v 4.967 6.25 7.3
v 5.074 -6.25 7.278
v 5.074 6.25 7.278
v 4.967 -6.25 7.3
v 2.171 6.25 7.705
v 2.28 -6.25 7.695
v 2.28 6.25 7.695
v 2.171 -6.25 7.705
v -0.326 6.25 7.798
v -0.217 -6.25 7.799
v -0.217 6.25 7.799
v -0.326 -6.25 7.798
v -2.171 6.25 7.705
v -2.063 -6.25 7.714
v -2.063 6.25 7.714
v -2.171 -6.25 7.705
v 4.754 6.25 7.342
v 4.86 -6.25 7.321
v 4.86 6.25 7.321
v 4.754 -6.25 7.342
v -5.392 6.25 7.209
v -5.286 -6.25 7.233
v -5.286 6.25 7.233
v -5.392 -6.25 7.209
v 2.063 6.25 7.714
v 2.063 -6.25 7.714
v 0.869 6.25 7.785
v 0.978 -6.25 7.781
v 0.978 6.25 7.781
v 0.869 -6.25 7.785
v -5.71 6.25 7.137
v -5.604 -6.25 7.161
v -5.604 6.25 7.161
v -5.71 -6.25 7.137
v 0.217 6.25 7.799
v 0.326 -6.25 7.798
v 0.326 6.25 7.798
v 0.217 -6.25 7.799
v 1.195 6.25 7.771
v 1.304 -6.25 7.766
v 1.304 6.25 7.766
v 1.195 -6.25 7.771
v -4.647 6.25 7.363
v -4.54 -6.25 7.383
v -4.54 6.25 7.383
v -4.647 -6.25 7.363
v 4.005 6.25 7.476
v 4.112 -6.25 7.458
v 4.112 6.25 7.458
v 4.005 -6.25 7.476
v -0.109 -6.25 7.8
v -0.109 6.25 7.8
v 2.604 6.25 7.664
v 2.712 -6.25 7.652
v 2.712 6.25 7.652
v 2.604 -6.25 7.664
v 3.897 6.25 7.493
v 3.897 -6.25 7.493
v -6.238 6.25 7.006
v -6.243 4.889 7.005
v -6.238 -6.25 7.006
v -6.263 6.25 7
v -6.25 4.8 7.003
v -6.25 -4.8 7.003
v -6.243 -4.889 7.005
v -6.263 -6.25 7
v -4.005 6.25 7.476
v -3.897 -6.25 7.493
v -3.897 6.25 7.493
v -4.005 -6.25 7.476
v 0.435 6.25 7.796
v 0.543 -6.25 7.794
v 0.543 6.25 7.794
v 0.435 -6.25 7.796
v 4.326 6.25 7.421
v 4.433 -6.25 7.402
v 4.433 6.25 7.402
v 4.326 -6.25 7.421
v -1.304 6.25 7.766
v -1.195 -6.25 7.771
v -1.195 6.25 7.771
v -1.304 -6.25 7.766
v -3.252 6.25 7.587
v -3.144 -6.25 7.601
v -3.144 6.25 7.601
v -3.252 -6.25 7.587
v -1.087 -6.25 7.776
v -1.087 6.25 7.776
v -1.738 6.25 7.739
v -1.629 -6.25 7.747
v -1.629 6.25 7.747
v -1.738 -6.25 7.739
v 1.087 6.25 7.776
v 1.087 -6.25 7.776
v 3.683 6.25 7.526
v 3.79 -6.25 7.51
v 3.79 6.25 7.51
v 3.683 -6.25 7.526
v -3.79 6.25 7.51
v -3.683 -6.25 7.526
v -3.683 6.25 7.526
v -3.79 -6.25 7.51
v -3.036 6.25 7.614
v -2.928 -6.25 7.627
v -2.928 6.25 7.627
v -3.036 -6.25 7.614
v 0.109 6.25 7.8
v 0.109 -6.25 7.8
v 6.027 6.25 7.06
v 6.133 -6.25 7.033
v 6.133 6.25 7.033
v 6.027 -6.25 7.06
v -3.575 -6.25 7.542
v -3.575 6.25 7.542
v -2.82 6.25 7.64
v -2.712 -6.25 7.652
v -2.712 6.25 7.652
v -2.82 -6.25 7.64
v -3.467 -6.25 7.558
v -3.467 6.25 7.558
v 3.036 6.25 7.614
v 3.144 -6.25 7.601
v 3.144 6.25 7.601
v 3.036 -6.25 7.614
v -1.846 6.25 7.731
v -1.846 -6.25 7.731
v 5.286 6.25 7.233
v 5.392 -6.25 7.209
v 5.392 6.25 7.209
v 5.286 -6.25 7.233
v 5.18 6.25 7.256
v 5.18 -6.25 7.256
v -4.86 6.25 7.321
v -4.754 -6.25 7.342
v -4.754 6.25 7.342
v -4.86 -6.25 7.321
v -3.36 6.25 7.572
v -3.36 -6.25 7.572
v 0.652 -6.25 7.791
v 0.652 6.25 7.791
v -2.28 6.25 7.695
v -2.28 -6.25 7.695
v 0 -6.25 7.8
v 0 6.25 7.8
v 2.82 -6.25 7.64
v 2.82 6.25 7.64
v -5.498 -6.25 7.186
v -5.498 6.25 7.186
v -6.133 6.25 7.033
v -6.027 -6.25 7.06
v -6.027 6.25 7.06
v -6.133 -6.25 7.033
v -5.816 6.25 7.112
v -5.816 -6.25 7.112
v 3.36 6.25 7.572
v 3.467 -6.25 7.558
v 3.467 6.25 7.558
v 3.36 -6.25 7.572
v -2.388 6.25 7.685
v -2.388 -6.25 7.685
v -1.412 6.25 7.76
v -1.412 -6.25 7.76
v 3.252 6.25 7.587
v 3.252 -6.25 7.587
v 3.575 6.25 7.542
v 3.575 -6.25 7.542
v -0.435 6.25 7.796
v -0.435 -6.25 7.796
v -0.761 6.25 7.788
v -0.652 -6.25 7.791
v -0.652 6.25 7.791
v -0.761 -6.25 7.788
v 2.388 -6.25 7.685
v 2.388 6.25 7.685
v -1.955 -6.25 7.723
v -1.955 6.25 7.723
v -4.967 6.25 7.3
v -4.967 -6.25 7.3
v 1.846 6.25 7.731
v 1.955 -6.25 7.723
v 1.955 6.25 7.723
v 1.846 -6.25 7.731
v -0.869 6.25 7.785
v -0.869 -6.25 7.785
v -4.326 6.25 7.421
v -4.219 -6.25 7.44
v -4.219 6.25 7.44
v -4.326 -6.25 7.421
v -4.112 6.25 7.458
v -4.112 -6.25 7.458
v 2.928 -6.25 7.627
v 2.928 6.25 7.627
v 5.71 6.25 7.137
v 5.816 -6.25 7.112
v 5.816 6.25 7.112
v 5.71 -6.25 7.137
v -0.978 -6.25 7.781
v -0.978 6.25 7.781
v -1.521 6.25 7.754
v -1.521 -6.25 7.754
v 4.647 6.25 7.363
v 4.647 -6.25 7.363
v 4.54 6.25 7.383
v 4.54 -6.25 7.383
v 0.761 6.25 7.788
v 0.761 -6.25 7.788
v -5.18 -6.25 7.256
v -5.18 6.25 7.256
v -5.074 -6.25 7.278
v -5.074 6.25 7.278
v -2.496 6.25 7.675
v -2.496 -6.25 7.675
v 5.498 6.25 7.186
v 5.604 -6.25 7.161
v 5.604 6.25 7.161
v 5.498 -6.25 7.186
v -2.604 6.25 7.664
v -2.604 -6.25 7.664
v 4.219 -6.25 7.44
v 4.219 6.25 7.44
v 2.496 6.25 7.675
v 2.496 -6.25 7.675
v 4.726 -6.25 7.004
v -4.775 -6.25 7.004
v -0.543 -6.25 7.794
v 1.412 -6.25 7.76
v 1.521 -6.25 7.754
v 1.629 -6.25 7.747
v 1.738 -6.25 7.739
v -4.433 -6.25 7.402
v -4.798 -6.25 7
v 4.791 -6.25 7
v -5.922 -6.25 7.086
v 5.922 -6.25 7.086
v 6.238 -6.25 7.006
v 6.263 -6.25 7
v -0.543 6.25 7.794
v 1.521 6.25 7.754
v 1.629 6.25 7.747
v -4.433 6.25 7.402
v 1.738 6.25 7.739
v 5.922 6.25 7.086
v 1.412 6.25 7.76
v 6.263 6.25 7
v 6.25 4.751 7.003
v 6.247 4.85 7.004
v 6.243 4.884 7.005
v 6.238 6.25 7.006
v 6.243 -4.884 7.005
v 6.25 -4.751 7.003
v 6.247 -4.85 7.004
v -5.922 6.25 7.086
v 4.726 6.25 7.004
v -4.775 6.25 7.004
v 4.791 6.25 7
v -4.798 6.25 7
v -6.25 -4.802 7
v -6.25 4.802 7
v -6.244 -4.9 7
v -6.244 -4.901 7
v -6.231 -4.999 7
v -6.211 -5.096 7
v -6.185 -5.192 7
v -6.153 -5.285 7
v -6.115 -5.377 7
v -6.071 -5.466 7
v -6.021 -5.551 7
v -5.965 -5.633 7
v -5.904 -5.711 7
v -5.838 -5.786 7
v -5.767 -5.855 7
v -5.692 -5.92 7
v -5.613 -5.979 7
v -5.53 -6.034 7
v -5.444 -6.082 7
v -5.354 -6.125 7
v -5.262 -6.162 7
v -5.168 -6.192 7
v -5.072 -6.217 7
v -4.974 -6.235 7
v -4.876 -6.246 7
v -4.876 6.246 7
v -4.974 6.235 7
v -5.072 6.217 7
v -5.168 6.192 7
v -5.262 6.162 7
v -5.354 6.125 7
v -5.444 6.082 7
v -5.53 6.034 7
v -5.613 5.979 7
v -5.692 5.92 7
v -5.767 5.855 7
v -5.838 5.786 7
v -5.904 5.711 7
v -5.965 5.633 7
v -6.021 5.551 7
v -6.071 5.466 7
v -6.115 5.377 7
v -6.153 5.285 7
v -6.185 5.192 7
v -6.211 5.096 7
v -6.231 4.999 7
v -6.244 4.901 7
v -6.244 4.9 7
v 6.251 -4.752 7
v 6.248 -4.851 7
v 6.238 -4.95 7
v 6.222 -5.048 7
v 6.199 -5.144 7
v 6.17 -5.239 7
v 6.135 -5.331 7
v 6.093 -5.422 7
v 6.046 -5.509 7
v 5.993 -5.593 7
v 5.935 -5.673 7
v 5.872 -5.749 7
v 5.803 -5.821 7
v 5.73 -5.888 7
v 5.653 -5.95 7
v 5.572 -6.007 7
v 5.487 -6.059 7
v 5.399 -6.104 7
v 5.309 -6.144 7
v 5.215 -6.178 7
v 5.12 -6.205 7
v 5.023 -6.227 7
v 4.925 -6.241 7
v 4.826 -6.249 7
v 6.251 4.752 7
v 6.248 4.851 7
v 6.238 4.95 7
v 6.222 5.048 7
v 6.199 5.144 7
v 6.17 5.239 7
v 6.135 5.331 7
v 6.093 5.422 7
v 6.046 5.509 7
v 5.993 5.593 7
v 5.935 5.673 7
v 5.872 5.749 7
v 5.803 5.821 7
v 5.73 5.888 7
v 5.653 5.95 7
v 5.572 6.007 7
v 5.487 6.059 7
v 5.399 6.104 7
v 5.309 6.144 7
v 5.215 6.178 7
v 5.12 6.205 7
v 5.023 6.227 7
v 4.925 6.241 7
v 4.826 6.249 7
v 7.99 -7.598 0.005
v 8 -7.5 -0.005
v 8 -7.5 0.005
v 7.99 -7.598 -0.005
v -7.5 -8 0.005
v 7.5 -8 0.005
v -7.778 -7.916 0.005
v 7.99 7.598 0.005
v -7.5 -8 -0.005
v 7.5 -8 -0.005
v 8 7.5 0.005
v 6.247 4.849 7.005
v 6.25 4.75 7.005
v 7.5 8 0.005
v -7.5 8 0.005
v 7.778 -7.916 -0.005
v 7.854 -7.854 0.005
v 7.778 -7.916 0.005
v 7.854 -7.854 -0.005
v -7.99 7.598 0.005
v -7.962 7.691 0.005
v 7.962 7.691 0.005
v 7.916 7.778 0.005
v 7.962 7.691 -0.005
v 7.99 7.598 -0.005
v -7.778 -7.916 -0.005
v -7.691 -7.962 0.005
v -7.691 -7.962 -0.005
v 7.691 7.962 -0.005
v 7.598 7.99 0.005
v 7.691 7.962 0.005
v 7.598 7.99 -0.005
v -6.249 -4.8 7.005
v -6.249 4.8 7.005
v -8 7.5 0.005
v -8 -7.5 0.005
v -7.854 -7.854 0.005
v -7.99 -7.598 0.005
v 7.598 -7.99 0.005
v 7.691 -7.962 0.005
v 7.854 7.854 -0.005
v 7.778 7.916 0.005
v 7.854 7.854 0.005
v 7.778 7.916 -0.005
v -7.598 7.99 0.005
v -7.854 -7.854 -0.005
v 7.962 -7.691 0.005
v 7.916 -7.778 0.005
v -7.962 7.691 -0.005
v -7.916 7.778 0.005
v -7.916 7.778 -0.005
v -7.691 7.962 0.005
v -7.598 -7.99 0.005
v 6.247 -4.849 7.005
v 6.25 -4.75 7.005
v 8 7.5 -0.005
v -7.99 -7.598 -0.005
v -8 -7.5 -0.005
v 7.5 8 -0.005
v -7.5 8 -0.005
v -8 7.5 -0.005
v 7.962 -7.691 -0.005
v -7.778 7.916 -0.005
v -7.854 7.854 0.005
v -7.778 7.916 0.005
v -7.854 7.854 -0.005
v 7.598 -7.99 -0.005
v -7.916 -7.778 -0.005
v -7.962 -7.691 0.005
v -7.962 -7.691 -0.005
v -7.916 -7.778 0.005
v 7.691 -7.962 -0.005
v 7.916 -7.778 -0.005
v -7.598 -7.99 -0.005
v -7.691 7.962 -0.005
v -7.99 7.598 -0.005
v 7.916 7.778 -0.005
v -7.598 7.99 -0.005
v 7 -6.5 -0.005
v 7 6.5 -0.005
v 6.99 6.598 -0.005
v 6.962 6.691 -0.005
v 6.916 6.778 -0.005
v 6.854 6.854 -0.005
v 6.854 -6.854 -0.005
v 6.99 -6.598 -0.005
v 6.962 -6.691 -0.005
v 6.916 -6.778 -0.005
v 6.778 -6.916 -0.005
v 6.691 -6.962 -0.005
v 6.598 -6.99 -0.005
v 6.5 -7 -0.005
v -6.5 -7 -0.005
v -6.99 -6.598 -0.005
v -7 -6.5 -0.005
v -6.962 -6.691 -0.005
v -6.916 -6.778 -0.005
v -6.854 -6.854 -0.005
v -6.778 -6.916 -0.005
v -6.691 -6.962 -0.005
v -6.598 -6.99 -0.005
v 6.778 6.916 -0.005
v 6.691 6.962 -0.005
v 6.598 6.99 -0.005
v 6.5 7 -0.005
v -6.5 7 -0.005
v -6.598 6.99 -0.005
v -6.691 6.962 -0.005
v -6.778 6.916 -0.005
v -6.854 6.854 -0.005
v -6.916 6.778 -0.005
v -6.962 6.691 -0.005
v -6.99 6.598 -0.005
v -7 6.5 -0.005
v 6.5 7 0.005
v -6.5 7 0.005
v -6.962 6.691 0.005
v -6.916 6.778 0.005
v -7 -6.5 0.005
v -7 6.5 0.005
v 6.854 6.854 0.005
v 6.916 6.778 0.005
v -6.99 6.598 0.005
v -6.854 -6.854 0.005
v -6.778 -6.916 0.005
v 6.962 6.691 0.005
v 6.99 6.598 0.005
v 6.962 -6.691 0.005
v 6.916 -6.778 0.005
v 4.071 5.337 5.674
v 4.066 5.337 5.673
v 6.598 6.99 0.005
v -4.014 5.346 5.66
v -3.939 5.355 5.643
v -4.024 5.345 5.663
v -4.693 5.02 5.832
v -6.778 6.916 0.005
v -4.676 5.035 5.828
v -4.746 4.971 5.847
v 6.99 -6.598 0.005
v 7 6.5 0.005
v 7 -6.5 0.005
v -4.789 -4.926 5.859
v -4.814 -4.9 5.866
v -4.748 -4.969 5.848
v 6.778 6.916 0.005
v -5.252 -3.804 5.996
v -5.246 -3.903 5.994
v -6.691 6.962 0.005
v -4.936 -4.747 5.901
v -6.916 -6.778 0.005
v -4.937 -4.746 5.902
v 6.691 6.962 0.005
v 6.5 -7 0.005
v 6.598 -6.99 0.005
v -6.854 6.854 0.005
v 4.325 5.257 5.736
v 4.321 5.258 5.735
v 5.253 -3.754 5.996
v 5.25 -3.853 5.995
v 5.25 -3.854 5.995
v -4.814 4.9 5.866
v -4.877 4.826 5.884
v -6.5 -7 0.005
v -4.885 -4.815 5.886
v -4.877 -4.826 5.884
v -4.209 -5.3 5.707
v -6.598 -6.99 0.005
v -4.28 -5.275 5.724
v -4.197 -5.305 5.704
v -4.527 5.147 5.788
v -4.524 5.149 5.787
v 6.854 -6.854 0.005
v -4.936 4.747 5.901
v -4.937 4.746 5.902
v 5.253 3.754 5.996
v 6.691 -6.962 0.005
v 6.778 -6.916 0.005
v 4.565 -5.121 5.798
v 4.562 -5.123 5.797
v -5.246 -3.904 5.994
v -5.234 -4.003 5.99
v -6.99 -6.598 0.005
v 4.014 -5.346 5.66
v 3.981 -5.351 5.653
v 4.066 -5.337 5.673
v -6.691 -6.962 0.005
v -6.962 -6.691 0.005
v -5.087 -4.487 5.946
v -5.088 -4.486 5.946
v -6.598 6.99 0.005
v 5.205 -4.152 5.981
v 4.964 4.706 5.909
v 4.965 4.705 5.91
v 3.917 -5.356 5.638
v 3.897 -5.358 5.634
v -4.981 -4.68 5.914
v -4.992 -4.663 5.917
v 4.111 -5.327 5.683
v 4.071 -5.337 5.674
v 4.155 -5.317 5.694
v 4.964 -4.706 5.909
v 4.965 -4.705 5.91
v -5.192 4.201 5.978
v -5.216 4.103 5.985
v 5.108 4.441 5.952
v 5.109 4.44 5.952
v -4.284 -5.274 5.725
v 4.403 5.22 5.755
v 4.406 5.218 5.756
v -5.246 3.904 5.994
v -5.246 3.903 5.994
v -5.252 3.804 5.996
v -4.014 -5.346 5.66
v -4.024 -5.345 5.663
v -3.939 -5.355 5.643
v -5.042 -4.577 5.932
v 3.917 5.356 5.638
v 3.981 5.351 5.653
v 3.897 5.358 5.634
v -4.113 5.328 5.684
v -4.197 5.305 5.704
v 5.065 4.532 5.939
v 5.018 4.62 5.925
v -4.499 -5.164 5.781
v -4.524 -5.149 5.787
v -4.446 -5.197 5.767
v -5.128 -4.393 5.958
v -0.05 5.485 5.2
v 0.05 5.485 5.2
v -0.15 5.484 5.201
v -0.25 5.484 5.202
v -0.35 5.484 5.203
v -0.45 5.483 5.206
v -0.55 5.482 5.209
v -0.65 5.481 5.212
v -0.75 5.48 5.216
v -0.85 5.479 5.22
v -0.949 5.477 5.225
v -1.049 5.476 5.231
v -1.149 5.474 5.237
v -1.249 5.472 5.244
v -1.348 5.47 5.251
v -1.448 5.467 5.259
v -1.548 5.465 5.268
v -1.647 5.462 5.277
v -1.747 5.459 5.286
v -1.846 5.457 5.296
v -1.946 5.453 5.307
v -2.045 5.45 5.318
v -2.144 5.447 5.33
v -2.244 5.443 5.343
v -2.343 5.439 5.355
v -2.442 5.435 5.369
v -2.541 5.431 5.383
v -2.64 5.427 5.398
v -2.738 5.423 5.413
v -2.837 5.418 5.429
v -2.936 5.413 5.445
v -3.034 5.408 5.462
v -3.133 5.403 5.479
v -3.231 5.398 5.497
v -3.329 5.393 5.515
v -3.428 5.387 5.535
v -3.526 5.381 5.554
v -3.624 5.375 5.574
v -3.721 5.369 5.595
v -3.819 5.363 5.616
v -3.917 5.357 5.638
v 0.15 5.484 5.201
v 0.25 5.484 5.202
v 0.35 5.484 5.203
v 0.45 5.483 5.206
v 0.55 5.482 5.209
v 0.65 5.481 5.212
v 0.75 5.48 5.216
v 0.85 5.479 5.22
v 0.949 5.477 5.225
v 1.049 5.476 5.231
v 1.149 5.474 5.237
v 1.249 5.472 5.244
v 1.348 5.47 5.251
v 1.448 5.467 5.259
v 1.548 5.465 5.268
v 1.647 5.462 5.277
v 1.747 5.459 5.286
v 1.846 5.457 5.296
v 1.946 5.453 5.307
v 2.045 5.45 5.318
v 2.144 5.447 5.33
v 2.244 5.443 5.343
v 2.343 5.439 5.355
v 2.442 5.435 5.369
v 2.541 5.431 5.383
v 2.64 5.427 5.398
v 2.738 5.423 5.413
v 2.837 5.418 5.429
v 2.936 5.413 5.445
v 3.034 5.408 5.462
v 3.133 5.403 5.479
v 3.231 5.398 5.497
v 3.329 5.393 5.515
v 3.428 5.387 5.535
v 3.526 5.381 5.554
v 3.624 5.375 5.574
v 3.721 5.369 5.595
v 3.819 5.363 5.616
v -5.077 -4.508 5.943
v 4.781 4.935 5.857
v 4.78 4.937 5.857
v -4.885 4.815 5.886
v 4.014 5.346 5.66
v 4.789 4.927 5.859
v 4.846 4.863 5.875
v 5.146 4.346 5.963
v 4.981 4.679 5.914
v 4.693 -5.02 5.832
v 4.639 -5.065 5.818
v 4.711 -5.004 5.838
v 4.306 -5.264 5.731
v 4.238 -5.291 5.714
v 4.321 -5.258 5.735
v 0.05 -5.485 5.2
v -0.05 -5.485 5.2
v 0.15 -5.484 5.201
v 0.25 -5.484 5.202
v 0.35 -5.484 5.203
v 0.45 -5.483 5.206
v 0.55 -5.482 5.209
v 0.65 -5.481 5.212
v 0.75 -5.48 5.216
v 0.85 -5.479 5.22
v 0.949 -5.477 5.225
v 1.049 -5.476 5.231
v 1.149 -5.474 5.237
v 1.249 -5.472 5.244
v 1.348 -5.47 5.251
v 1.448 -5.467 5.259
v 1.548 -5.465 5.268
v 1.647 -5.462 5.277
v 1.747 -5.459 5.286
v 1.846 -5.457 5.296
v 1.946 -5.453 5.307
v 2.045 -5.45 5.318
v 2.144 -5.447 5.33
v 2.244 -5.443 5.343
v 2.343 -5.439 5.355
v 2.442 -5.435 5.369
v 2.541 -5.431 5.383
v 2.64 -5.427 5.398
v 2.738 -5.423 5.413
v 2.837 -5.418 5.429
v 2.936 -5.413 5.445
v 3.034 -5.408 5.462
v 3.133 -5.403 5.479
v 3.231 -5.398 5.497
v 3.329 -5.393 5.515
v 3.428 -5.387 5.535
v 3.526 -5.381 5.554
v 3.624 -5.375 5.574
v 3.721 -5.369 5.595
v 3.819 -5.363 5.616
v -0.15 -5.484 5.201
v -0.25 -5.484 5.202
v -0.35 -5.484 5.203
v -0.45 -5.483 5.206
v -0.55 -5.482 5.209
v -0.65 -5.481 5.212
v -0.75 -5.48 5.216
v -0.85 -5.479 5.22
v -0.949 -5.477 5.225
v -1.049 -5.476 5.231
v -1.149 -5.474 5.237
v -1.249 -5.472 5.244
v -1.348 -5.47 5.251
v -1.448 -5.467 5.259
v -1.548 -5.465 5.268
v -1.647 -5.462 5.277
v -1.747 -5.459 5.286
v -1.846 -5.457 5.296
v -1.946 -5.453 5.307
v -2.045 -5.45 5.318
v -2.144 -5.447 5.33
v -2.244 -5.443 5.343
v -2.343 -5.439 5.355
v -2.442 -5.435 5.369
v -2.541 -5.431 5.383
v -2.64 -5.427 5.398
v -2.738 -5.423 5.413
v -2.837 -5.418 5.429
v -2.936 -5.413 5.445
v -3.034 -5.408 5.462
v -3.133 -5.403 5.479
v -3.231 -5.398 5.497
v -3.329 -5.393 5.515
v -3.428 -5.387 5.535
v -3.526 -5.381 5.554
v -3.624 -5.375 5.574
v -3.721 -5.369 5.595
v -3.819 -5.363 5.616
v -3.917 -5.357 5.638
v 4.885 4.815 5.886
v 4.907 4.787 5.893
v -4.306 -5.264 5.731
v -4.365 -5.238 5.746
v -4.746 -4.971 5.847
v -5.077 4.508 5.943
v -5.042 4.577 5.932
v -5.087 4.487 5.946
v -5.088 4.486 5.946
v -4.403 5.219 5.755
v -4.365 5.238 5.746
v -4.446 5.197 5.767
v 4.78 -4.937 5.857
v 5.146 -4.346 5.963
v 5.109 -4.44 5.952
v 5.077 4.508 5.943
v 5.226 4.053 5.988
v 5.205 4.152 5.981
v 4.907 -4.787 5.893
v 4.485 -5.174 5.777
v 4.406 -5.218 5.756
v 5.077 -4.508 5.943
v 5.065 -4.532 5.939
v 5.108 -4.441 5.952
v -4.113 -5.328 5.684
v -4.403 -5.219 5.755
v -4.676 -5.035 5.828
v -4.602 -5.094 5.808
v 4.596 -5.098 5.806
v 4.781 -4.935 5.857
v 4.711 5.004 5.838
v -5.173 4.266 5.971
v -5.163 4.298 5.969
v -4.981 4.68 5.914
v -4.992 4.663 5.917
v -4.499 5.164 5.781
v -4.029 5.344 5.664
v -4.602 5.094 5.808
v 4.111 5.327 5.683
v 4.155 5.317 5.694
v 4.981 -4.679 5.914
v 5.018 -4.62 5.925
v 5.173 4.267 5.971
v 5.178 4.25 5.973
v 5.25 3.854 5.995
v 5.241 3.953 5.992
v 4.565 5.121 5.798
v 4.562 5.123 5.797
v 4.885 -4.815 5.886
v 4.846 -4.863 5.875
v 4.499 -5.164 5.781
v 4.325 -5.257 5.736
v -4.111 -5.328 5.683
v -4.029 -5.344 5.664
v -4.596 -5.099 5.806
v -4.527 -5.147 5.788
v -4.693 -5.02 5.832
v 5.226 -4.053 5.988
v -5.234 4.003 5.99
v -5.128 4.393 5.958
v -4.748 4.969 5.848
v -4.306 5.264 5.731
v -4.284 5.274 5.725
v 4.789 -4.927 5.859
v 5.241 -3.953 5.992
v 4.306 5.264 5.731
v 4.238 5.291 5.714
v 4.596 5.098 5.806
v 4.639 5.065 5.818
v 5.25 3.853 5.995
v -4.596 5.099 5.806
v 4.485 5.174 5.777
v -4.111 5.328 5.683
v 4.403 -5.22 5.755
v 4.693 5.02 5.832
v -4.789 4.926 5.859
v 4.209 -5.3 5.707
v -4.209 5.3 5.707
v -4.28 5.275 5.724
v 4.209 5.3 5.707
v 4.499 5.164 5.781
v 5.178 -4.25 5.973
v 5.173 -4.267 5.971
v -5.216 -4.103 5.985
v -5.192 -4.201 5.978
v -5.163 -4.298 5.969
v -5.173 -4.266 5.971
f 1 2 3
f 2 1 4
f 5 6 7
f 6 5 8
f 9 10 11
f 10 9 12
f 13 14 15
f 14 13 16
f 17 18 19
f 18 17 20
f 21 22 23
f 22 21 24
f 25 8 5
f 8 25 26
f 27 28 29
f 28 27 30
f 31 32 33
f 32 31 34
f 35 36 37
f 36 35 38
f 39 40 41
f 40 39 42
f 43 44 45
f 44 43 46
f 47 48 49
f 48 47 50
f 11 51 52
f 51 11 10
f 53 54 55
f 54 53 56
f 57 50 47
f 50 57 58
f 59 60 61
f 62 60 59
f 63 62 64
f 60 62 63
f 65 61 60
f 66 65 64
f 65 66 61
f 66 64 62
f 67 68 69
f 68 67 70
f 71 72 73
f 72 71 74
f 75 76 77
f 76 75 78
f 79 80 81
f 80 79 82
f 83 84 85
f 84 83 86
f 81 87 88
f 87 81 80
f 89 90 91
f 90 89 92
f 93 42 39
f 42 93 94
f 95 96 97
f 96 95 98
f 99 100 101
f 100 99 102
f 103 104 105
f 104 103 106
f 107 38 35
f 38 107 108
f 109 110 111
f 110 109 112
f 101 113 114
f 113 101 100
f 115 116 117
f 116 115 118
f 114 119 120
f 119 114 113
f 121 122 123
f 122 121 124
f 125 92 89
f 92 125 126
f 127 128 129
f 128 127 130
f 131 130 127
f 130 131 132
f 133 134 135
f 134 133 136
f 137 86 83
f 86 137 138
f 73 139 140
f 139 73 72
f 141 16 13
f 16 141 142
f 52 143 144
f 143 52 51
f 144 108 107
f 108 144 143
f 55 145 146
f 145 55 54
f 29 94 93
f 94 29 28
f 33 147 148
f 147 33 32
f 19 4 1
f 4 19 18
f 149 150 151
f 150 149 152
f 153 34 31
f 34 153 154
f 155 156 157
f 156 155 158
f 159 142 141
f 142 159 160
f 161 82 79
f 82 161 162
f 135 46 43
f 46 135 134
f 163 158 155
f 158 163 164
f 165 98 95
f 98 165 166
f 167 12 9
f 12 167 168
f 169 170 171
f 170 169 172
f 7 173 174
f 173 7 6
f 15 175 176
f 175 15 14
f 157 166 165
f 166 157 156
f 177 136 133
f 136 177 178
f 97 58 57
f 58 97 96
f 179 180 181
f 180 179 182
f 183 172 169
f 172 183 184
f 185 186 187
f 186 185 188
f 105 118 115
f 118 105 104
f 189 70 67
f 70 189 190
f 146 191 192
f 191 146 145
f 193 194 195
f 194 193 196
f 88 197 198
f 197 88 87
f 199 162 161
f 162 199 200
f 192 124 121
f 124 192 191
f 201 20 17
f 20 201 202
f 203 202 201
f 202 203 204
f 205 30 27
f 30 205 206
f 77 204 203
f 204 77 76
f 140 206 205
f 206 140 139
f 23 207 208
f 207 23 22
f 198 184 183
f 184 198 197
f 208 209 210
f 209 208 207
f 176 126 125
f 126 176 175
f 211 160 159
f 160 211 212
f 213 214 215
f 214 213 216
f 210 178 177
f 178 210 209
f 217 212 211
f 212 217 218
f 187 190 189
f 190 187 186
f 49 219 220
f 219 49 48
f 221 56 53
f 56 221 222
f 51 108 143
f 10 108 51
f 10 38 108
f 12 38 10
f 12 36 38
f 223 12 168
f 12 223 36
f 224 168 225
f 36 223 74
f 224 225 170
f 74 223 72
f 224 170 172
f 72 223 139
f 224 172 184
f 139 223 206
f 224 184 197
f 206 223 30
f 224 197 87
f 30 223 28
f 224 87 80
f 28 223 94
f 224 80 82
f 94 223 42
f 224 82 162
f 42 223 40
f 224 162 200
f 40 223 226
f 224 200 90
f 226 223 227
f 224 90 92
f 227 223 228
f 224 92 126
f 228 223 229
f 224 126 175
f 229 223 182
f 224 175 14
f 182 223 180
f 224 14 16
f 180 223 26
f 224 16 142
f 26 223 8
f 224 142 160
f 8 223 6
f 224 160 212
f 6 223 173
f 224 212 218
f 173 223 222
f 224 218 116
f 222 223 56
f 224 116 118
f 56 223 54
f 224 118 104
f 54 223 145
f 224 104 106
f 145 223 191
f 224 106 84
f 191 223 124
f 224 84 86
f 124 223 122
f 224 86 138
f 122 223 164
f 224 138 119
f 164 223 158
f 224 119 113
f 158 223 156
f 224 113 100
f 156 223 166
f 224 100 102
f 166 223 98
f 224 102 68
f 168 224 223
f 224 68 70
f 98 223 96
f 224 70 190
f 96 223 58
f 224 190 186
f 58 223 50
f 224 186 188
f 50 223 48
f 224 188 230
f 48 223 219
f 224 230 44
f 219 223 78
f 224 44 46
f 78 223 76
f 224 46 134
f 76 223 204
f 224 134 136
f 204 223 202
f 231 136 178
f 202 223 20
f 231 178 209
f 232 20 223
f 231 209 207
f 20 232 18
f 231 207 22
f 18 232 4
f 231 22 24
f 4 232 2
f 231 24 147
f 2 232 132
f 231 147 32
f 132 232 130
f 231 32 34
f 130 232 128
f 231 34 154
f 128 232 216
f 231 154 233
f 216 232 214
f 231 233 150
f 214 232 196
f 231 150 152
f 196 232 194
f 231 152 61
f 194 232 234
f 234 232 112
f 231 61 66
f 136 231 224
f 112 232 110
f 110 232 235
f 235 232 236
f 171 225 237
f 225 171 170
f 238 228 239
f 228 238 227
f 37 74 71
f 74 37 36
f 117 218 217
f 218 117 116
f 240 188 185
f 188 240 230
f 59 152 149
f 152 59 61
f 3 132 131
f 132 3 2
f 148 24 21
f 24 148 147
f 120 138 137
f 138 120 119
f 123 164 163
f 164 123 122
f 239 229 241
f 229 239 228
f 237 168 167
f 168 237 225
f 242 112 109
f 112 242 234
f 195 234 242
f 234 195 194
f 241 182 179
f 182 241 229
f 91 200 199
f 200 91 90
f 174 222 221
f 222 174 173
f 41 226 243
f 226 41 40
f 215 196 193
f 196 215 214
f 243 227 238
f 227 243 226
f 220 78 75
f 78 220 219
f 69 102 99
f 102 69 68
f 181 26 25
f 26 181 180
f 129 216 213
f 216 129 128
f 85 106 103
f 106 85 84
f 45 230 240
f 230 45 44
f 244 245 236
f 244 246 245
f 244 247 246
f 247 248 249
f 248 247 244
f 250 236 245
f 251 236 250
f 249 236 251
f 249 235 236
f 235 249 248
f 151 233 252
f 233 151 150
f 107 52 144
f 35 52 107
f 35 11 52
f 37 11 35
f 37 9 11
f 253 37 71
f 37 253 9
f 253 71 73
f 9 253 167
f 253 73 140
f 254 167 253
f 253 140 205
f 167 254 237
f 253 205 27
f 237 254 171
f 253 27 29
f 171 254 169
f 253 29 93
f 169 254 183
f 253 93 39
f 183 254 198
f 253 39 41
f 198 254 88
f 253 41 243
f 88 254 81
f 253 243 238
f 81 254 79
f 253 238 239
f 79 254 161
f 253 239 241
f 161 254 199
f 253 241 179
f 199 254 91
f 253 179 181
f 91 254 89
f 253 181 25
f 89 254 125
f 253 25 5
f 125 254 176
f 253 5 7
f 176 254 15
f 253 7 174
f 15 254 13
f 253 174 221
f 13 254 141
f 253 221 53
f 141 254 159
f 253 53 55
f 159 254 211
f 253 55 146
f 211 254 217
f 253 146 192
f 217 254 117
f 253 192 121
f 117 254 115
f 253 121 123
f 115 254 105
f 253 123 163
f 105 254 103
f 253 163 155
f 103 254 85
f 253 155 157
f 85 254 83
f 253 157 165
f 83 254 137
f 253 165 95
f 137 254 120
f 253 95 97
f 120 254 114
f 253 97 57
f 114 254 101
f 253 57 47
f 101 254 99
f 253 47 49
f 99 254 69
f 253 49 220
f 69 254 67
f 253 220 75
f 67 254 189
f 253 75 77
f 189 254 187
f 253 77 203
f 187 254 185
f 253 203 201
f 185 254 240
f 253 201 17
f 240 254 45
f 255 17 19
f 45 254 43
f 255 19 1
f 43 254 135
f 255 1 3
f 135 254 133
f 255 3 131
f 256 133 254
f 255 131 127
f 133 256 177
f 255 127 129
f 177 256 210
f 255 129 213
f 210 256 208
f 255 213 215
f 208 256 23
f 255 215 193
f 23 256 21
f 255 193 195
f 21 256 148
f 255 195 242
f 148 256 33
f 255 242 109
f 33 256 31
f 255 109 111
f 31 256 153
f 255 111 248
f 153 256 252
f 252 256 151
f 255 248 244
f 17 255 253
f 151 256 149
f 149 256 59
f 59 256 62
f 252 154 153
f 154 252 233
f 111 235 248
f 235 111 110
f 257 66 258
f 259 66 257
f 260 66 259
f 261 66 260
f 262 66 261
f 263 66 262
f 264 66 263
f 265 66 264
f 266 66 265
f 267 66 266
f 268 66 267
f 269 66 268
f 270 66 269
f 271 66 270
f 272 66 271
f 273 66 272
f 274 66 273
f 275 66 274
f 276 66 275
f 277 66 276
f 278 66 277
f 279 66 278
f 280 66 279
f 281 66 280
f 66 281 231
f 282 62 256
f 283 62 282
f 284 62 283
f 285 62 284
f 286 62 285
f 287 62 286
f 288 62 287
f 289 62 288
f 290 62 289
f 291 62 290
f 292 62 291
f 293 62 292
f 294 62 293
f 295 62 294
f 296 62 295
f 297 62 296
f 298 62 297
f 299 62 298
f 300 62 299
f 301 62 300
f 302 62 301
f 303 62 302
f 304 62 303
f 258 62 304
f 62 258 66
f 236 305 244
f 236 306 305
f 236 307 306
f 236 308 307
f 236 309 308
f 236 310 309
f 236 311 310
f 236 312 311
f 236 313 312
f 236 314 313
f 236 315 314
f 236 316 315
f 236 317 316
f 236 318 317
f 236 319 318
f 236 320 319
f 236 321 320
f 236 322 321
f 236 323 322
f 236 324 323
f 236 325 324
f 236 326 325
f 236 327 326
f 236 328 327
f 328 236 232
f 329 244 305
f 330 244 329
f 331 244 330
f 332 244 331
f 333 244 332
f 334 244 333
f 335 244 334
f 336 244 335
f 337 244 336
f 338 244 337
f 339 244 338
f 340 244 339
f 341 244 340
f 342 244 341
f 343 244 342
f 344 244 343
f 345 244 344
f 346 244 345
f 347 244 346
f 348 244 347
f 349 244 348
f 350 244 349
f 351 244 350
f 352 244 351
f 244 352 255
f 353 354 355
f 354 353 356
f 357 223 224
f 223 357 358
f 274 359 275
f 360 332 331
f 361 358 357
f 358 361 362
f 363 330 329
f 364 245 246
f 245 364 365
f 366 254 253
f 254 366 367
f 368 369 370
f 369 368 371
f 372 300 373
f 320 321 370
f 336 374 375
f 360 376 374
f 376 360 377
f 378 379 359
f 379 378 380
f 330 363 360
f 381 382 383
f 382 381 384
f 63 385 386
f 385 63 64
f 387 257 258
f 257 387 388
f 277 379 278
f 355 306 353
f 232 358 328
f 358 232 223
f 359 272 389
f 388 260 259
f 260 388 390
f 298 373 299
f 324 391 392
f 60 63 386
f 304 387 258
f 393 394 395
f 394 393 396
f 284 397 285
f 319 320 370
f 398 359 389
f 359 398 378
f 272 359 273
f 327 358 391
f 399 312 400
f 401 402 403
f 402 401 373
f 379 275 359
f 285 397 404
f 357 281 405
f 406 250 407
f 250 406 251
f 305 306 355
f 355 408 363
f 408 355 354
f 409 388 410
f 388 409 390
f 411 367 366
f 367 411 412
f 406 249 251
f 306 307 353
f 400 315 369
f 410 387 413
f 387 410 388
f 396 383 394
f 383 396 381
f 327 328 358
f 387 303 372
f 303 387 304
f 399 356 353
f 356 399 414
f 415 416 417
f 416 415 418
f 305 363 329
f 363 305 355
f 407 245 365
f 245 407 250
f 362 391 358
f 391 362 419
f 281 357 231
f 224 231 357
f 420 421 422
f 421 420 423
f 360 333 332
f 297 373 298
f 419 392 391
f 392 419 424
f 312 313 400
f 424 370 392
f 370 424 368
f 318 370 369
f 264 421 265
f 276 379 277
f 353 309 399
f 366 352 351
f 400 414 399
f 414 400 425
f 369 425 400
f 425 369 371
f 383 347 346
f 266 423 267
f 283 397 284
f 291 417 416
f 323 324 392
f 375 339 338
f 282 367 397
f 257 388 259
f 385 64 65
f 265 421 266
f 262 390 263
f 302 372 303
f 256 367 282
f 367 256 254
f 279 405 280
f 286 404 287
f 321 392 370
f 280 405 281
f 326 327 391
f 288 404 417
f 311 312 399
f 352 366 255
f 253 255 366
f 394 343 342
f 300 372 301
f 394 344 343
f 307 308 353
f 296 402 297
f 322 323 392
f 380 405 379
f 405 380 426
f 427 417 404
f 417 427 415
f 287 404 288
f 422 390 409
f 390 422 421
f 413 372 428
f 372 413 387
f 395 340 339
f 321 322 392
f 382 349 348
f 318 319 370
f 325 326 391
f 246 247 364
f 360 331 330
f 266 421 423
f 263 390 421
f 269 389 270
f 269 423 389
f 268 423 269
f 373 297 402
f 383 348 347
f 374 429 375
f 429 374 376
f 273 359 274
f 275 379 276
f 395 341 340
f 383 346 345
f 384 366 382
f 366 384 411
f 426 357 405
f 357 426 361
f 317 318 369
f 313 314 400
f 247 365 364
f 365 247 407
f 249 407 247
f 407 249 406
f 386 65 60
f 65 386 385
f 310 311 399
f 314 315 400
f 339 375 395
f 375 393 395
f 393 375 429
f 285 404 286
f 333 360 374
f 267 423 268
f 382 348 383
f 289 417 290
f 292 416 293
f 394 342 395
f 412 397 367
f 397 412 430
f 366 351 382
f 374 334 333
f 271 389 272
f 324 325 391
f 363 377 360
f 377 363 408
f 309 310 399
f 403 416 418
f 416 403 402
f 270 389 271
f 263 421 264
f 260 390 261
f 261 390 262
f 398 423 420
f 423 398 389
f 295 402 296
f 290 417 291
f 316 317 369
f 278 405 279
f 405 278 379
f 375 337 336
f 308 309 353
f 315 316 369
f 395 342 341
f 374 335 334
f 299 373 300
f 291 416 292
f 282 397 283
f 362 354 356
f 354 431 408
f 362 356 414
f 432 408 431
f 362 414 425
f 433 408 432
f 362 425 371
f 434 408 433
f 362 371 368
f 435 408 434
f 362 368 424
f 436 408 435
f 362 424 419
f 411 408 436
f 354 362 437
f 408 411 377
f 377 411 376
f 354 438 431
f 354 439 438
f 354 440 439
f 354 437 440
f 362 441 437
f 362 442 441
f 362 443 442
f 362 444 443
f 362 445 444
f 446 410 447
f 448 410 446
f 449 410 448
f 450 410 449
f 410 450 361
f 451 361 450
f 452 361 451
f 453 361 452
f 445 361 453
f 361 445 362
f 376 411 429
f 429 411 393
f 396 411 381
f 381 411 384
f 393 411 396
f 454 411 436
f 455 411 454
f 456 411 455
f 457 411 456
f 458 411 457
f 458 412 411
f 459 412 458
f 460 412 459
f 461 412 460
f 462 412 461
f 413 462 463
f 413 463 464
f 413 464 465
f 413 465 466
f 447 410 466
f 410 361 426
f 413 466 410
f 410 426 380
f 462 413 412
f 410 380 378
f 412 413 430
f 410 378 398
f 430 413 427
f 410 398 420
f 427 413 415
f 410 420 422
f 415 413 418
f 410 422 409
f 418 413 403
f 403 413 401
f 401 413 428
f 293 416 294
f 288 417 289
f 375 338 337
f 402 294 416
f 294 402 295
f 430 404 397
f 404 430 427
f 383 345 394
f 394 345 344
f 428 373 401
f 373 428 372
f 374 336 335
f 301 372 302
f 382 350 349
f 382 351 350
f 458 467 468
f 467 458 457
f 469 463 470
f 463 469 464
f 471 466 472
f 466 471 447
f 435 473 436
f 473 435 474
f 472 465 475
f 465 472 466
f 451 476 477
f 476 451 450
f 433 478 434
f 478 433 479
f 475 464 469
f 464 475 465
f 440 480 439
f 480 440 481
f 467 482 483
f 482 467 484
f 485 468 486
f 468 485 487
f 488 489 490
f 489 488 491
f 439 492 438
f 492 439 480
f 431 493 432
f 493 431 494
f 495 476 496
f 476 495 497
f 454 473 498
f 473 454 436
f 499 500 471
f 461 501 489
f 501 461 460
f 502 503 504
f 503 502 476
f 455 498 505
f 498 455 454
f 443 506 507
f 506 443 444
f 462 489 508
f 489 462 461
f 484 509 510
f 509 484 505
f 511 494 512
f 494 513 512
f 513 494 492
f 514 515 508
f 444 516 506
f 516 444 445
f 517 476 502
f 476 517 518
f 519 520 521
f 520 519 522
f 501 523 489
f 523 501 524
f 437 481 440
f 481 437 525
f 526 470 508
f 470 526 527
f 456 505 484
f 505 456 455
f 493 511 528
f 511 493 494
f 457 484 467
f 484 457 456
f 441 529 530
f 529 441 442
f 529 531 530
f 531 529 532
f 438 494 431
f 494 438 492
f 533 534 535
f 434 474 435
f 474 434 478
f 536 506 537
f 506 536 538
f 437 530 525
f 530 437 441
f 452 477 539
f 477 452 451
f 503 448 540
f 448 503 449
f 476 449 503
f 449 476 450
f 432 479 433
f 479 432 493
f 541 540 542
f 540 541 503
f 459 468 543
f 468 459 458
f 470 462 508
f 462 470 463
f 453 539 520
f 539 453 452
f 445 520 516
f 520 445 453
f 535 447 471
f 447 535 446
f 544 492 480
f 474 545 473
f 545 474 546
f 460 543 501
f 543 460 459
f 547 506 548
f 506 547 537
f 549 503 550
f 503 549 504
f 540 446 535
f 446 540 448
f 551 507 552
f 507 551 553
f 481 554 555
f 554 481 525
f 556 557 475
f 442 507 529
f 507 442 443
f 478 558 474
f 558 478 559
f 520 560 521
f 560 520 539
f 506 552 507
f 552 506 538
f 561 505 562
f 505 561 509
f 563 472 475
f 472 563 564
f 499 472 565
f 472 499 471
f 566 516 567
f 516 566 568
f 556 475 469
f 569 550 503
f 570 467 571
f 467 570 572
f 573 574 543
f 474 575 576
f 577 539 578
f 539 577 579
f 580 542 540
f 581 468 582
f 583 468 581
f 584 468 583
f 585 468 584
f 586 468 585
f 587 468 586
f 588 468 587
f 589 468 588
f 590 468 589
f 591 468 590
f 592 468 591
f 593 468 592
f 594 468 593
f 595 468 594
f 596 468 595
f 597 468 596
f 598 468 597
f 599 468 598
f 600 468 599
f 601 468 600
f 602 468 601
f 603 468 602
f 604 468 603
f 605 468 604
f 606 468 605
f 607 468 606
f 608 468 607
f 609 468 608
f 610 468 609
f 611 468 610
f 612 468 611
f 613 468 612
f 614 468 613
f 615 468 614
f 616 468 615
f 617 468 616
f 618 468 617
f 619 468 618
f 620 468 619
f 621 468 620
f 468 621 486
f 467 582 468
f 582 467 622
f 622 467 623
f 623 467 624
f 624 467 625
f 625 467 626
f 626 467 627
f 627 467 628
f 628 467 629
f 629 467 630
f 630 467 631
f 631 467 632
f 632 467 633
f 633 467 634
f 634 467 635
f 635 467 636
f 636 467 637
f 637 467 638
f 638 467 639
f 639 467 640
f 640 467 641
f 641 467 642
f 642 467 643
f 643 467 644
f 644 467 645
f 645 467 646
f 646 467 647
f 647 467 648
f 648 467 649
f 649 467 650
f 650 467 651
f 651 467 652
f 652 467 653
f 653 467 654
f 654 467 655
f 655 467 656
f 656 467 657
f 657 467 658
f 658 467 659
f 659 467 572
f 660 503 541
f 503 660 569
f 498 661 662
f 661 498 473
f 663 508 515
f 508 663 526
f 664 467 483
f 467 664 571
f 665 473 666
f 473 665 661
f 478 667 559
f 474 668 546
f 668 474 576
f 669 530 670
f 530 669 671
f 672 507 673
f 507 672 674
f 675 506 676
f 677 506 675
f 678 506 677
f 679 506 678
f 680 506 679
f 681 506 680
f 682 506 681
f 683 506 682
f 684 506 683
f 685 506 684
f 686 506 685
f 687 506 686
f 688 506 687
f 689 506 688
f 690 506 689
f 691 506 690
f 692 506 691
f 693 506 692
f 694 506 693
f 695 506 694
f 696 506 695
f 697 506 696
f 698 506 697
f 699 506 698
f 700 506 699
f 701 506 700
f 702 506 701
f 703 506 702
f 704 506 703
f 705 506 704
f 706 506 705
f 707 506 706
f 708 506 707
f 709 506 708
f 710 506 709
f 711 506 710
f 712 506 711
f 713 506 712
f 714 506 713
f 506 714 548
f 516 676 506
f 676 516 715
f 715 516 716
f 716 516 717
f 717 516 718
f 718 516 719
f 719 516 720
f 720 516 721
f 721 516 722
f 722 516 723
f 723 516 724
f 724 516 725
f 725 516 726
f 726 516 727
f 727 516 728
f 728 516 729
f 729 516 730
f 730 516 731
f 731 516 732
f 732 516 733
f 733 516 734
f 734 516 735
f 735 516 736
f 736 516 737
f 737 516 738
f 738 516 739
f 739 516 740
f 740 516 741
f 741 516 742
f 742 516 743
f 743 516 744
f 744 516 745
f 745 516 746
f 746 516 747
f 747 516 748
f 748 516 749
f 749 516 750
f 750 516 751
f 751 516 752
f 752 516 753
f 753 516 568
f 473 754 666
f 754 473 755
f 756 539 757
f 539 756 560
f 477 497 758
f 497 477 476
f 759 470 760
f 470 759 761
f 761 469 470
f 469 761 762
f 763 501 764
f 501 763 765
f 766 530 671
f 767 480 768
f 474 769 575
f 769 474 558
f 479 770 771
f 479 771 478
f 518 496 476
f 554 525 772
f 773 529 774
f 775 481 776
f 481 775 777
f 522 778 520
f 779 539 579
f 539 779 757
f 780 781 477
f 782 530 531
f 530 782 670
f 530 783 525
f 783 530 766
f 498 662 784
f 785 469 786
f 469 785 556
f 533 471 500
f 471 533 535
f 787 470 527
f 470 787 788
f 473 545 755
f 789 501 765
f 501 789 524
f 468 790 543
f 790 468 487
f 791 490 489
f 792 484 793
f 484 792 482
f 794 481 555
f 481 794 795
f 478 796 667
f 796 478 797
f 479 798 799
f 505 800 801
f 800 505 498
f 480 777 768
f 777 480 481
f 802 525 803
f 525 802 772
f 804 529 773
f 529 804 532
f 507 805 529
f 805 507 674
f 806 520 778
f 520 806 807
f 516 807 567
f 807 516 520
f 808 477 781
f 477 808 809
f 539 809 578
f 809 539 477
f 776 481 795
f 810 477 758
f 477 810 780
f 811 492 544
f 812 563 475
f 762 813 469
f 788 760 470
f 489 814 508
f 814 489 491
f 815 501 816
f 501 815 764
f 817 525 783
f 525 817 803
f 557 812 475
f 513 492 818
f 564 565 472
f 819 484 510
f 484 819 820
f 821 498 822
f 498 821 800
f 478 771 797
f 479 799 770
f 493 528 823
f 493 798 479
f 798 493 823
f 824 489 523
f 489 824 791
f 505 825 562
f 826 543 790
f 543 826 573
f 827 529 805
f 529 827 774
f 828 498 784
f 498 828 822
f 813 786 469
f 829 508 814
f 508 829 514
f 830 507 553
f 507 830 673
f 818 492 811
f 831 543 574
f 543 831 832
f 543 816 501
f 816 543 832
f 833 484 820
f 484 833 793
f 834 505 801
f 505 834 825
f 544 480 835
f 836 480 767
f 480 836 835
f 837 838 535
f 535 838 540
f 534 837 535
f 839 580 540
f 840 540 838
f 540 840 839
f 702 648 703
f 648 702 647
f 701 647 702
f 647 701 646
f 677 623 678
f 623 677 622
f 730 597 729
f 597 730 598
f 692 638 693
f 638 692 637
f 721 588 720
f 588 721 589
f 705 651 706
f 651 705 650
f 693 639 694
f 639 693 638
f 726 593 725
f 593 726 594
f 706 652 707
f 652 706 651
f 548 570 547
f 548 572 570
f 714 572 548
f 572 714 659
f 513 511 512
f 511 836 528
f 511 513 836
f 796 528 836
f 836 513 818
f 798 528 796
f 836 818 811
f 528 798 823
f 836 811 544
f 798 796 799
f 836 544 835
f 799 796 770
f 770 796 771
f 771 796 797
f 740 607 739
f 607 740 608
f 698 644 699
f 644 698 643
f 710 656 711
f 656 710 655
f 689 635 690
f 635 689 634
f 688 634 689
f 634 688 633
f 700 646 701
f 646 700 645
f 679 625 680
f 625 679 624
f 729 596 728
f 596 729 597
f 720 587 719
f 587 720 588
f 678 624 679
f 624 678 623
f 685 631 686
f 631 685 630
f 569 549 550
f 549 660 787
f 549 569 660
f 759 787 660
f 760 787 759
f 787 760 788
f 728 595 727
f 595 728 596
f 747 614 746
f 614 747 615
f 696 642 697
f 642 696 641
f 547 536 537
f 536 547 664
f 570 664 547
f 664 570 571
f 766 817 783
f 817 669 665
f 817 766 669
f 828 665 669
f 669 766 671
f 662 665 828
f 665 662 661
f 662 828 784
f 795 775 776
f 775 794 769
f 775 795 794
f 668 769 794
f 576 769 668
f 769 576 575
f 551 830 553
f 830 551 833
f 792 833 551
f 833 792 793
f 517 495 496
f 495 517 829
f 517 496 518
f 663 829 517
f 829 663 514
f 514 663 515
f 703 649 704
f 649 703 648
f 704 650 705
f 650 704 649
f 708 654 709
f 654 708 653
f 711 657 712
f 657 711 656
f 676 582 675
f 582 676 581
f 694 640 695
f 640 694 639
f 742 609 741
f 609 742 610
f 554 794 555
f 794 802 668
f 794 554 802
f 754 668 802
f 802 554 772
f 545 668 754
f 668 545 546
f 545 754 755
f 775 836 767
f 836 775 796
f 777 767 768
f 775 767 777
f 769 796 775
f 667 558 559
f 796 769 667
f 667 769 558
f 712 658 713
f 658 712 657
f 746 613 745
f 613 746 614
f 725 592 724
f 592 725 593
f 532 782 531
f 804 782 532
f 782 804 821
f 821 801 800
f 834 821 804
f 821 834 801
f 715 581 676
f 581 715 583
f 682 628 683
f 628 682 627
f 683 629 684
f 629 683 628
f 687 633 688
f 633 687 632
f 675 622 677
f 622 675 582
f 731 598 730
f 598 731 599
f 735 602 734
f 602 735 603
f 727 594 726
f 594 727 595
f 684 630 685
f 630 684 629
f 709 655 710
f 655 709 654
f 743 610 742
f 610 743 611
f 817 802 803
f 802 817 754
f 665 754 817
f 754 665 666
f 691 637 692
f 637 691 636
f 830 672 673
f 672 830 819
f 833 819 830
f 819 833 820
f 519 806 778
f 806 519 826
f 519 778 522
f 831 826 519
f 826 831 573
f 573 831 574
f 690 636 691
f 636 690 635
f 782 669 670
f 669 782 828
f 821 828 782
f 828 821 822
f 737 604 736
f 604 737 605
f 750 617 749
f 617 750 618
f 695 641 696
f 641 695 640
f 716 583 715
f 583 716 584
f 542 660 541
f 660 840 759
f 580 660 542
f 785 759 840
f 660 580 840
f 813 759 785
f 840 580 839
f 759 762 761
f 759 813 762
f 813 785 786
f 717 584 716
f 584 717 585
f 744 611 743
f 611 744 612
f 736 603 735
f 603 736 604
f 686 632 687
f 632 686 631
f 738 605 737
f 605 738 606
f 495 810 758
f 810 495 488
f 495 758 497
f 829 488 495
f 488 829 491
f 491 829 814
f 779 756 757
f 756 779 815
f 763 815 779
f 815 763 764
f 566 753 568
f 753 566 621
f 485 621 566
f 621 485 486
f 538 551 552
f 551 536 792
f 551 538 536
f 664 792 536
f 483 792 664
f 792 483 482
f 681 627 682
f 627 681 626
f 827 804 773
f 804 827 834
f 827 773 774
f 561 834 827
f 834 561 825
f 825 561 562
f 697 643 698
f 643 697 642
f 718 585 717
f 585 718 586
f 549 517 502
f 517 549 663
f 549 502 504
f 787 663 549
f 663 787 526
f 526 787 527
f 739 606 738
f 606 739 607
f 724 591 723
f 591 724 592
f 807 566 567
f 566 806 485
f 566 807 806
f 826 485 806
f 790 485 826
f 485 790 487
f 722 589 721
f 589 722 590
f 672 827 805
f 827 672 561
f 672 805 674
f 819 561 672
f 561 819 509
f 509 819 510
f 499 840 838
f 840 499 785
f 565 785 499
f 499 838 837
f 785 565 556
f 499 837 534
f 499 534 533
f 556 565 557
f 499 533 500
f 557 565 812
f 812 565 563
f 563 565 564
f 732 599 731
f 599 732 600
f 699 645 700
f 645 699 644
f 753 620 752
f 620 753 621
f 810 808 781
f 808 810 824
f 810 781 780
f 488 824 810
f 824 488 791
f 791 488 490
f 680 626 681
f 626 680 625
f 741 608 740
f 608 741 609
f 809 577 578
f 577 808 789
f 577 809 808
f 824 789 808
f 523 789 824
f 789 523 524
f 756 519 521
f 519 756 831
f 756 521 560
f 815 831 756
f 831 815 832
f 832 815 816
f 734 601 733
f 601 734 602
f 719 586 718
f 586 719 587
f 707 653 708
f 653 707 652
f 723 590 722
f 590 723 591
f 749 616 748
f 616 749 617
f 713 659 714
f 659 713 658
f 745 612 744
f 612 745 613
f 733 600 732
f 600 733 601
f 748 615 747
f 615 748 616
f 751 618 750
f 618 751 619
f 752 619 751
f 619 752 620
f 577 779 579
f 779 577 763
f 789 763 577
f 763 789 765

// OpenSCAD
// file: stem.scad
$fs = 0.1;

// --------
// ステム
// --------
stem_outer_size = 5.5;
stem_cross_length = 4.0;
stem_cross_h = 1.25;
stem_cross_v = 1.10;

module stem() {
  difference () {
    cylinder(d = stem_outer_size, h=15);
    // 十字部分
    translate([0, 0, 15 / 2])
      cube([stem_cross_h, stem_cross_length, 15], center = true);
    translate([0, 0, 15 / 2])
      cube([stem_cross_length, stem_cross_v, 15], center = true);
  }
}
// file: keycap_base.scad
$fs = 0.1;
$fa = 0.25;  // くり抜く円柱を作成のため、精度を上げる

use <stem.scad>

key_bottom = 16;
key_top = 12.5;

base_height = 7;

// --------
// キャップ部分
// --------

// 角が丸い四角
module rounded_cube(size, r) {
  // cylinder の高さ (適当な値)
  h = 0.0001;
  minkowski() {
    cube([size[0] - r*2, size[1] - r*2, size[2] - h], center = true);
    cylinder(r = r, h = h);
  }
}

// くり抜くための円を作成する
function dish_r(w, d) = (w * w + 4 * d) / (8 * d);

// 四角
module keycap_outer_shape (key_bottom_size, key_top_size, key_top_height, angle, dish_depth) {
  difference() {
    // 基本的なキーキャップを作成
    hull() {
      // cherry プロファイルっぽく上にずらす
      translate([0, 0, key_top_height])
        rotate([- angle,  0, 0])
          rounded_cube([key_top_size, key_top_size, 0.01], 1.5);
      rounded_cube([key_bottom_size, key_bottom_size, 0.01], 0.5);
    }

    // くり抜く円柱を作成
    translate([0, 0, key_top_height])
      rotate([- angle, 0, 0])
      translate([0, 0, dish_r(key_top_size, dish_depth) - dish_depth])
        rotate([90, 0, 0])
        cylinder(r = dish_r(key_top_size, dish_depth), h = 60, center = true);
  }
}

// キーキャップのくり抜くための四角
module keycap_inner_shape(bottom, top, height, angle, depth) {
    thickness = 1;
    keycap_outer_shape(bottom - (thickness * 2), top - (thickness * 2), height - thickness, angle, depth);
}

// スイッチ部分をくり抜いてキーキャップを作成
module keycap_shape(bottom, top, height, angle) {
  depth = 0.8;
  difference () {
    keycap_outer_shape(bottom, top, height, angle, depth); 
    keycap_inner_shape(bottom, top, height, angle, depth);
  }
}

module keycap(key_height, key_angle) {

  keycap_shape(key_bottom, key_top, key_height, key_angle);

  // キーキャップと合わせられるステムを作成
  intersection() {
    stem();
    // キートップの厚さは1.5mmとする
    keycap_outer_shape(key_bottom, key_top, key_height, key_angle, 1.5);
  }
}
// main file
include <keycap_base.scad>
include <stem.scad>

// 膨らみを表現する
module convex_top(key_top_height, key_top_size, dish_depth, angle) {
  difference() {
    translate([0, 0, key_top_height])
      rotate([- angle, 0, 0])
      translate([0, 0, -(dish_r(key_top_size, dish_depth) - dish_depth)])
        rotate([90, 0, 0])
          cylinder(r = dish_r(key_top_size, dish_depth), h = key_top_size, center = true);

    translate([0, 0, -(100/2)+key_top_height])
      cube([100, key_top_size+10, 100], center=true);

    translate([0, 0, -(100/2)+key_top_height])
      cube([100, key_top_size-4, 100], center=true);
  }
}

// 四角
module keycap_convex_outer_shape (key_bottom_size, key_top_size, key_top_height, angle, dish_depth) {
  /* difference() { */
    // 基本的なキーキャップを作成
    hull() {
      // cherry プロファイルっぽく上にずらす
      translate([0, 0, key_top_height])
        rotate([- angle,  0, 0])
          rounded_cube([key_top_size, key_top_size, 0.01], 1.5);
      rounded_cube([key_bottom_size, key_bottom_size, 0.01], 0.5);
    }

    convex_top(key_top_height, key_top_size, dish_depth, angle);

  /* } */
}

// キーキャップのくり抜くための四角
module keycap_convex_inner_shape(bottom, top, height, angle, depth) {
    thickness = 1;
    keycap_outer_shape(bottom - (thickness * 2), top - (thickness * 2), height - thickness, angle, depth);
}


// スイッチ部分をくり抜いてキーキャップを作成
module keycap_convex_shape(bottom, top, height, angle) {
  // くぼみの深さ
  depth = 0.8;
  difference () {
    keycap_convex_outer_shape(bottom, top, height, angle, depth); 
    keycap_convex_inner_shape(bottom, top, height, angle, depth);
  }
}

module keycap_convex(key_height) {

  keycap_convex_shape(key_bottom, key_top, key_height, 0);

  /* // キーキャップと合わせられるステムを作成          */
  /* intersection() {                                                      */
  /*   stem();                                                             */
  /*   // キートップの厚さは1.5mmとする                        */
  /*   keycap_convex_outer_shape(key_bottom, key_top, key_height, 0, 1.5); */
  /* }                                                                     */
}

keycap_convex(base_height);

/* convex_top(key_bottom, key_top, base_height, 0); */
